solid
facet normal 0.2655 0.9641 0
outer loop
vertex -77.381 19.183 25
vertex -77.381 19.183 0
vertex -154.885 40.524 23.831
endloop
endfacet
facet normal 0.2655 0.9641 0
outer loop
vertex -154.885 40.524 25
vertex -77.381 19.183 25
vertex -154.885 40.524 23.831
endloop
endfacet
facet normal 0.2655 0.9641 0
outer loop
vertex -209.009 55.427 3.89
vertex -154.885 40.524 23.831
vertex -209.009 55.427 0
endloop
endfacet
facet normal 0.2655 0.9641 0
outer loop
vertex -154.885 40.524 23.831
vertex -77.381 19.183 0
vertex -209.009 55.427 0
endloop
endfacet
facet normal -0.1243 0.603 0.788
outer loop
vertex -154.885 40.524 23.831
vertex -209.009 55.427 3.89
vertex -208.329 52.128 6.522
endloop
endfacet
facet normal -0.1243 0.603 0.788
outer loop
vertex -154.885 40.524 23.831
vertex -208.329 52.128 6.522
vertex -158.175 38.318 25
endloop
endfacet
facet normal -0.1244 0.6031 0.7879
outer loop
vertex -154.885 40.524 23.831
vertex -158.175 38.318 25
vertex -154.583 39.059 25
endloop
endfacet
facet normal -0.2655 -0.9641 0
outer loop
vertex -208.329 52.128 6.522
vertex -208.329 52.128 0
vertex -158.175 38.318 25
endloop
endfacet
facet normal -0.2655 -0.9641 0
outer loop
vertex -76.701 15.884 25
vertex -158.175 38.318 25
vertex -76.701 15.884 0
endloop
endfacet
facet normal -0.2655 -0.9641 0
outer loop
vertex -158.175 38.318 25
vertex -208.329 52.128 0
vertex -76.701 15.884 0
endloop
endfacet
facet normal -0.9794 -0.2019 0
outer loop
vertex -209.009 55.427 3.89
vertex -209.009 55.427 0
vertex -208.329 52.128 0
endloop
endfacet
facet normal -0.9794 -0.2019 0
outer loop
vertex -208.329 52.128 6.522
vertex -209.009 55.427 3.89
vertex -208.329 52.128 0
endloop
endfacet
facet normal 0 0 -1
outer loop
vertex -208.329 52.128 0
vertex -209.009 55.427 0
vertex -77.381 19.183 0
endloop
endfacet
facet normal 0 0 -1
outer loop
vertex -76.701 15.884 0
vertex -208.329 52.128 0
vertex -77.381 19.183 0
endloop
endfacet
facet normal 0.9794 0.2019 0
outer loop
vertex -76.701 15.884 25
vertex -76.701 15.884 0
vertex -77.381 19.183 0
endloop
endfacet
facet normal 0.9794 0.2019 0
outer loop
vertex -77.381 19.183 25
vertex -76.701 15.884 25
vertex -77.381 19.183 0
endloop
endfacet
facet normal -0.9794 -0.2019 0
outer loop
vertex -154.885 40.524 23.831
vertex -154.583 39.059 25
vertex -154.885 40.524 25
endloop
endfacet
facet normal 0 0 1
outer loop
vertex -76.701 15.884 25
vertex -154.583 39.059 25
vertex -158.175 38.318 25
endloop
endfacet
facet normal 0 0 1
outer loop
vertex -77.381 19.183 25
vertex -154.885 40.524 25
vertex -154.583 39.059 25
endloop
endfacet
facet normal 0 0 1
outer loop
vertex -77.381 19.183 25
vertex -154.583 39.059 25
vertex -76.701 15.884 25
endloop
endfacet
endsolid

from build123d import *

# Parameters (mm, degrees)
BOSS_EXTRUDE3_DEPTH = 25
CUT_EXTRUDE1_DEPTH  = 17.63474099


with BuildPart() as part:
    # Sketch6 → Boss-Extrude3 (new body)
    with BuildSketch(Plane.XY):
        Polygon((-76.7010904, 15.884310045), (-77.381092708, 19.183202304), (-209.008603901, 55.427262562), (-208.328601592, 52.128370303), align=None)
    extrude(amount=BOSS_EXTRUDE3_DEPTH)

    # Sketch7 → Cut-Extrude1 (cut, through all)
    with BuildSketch(Plane(origin=(-7.764079932, 37.665847394, 49.223649712), x_dir=(0.992149154, 0.086592284, 0.090232106), z_dir=(-0.124293475, 0.602984398, 0.788010754))):
        Polygon((-196.71104708, 7.314103793), (-147.250967101, 14.642165505), (-153.953814385, 59.882418078), (-203.413894364, 52.554356365), align=None)
    extrude(amount=CUT_EXTRUDE1_DEPTH, mode=Mode.SUBTRACT)


solid = part.part
